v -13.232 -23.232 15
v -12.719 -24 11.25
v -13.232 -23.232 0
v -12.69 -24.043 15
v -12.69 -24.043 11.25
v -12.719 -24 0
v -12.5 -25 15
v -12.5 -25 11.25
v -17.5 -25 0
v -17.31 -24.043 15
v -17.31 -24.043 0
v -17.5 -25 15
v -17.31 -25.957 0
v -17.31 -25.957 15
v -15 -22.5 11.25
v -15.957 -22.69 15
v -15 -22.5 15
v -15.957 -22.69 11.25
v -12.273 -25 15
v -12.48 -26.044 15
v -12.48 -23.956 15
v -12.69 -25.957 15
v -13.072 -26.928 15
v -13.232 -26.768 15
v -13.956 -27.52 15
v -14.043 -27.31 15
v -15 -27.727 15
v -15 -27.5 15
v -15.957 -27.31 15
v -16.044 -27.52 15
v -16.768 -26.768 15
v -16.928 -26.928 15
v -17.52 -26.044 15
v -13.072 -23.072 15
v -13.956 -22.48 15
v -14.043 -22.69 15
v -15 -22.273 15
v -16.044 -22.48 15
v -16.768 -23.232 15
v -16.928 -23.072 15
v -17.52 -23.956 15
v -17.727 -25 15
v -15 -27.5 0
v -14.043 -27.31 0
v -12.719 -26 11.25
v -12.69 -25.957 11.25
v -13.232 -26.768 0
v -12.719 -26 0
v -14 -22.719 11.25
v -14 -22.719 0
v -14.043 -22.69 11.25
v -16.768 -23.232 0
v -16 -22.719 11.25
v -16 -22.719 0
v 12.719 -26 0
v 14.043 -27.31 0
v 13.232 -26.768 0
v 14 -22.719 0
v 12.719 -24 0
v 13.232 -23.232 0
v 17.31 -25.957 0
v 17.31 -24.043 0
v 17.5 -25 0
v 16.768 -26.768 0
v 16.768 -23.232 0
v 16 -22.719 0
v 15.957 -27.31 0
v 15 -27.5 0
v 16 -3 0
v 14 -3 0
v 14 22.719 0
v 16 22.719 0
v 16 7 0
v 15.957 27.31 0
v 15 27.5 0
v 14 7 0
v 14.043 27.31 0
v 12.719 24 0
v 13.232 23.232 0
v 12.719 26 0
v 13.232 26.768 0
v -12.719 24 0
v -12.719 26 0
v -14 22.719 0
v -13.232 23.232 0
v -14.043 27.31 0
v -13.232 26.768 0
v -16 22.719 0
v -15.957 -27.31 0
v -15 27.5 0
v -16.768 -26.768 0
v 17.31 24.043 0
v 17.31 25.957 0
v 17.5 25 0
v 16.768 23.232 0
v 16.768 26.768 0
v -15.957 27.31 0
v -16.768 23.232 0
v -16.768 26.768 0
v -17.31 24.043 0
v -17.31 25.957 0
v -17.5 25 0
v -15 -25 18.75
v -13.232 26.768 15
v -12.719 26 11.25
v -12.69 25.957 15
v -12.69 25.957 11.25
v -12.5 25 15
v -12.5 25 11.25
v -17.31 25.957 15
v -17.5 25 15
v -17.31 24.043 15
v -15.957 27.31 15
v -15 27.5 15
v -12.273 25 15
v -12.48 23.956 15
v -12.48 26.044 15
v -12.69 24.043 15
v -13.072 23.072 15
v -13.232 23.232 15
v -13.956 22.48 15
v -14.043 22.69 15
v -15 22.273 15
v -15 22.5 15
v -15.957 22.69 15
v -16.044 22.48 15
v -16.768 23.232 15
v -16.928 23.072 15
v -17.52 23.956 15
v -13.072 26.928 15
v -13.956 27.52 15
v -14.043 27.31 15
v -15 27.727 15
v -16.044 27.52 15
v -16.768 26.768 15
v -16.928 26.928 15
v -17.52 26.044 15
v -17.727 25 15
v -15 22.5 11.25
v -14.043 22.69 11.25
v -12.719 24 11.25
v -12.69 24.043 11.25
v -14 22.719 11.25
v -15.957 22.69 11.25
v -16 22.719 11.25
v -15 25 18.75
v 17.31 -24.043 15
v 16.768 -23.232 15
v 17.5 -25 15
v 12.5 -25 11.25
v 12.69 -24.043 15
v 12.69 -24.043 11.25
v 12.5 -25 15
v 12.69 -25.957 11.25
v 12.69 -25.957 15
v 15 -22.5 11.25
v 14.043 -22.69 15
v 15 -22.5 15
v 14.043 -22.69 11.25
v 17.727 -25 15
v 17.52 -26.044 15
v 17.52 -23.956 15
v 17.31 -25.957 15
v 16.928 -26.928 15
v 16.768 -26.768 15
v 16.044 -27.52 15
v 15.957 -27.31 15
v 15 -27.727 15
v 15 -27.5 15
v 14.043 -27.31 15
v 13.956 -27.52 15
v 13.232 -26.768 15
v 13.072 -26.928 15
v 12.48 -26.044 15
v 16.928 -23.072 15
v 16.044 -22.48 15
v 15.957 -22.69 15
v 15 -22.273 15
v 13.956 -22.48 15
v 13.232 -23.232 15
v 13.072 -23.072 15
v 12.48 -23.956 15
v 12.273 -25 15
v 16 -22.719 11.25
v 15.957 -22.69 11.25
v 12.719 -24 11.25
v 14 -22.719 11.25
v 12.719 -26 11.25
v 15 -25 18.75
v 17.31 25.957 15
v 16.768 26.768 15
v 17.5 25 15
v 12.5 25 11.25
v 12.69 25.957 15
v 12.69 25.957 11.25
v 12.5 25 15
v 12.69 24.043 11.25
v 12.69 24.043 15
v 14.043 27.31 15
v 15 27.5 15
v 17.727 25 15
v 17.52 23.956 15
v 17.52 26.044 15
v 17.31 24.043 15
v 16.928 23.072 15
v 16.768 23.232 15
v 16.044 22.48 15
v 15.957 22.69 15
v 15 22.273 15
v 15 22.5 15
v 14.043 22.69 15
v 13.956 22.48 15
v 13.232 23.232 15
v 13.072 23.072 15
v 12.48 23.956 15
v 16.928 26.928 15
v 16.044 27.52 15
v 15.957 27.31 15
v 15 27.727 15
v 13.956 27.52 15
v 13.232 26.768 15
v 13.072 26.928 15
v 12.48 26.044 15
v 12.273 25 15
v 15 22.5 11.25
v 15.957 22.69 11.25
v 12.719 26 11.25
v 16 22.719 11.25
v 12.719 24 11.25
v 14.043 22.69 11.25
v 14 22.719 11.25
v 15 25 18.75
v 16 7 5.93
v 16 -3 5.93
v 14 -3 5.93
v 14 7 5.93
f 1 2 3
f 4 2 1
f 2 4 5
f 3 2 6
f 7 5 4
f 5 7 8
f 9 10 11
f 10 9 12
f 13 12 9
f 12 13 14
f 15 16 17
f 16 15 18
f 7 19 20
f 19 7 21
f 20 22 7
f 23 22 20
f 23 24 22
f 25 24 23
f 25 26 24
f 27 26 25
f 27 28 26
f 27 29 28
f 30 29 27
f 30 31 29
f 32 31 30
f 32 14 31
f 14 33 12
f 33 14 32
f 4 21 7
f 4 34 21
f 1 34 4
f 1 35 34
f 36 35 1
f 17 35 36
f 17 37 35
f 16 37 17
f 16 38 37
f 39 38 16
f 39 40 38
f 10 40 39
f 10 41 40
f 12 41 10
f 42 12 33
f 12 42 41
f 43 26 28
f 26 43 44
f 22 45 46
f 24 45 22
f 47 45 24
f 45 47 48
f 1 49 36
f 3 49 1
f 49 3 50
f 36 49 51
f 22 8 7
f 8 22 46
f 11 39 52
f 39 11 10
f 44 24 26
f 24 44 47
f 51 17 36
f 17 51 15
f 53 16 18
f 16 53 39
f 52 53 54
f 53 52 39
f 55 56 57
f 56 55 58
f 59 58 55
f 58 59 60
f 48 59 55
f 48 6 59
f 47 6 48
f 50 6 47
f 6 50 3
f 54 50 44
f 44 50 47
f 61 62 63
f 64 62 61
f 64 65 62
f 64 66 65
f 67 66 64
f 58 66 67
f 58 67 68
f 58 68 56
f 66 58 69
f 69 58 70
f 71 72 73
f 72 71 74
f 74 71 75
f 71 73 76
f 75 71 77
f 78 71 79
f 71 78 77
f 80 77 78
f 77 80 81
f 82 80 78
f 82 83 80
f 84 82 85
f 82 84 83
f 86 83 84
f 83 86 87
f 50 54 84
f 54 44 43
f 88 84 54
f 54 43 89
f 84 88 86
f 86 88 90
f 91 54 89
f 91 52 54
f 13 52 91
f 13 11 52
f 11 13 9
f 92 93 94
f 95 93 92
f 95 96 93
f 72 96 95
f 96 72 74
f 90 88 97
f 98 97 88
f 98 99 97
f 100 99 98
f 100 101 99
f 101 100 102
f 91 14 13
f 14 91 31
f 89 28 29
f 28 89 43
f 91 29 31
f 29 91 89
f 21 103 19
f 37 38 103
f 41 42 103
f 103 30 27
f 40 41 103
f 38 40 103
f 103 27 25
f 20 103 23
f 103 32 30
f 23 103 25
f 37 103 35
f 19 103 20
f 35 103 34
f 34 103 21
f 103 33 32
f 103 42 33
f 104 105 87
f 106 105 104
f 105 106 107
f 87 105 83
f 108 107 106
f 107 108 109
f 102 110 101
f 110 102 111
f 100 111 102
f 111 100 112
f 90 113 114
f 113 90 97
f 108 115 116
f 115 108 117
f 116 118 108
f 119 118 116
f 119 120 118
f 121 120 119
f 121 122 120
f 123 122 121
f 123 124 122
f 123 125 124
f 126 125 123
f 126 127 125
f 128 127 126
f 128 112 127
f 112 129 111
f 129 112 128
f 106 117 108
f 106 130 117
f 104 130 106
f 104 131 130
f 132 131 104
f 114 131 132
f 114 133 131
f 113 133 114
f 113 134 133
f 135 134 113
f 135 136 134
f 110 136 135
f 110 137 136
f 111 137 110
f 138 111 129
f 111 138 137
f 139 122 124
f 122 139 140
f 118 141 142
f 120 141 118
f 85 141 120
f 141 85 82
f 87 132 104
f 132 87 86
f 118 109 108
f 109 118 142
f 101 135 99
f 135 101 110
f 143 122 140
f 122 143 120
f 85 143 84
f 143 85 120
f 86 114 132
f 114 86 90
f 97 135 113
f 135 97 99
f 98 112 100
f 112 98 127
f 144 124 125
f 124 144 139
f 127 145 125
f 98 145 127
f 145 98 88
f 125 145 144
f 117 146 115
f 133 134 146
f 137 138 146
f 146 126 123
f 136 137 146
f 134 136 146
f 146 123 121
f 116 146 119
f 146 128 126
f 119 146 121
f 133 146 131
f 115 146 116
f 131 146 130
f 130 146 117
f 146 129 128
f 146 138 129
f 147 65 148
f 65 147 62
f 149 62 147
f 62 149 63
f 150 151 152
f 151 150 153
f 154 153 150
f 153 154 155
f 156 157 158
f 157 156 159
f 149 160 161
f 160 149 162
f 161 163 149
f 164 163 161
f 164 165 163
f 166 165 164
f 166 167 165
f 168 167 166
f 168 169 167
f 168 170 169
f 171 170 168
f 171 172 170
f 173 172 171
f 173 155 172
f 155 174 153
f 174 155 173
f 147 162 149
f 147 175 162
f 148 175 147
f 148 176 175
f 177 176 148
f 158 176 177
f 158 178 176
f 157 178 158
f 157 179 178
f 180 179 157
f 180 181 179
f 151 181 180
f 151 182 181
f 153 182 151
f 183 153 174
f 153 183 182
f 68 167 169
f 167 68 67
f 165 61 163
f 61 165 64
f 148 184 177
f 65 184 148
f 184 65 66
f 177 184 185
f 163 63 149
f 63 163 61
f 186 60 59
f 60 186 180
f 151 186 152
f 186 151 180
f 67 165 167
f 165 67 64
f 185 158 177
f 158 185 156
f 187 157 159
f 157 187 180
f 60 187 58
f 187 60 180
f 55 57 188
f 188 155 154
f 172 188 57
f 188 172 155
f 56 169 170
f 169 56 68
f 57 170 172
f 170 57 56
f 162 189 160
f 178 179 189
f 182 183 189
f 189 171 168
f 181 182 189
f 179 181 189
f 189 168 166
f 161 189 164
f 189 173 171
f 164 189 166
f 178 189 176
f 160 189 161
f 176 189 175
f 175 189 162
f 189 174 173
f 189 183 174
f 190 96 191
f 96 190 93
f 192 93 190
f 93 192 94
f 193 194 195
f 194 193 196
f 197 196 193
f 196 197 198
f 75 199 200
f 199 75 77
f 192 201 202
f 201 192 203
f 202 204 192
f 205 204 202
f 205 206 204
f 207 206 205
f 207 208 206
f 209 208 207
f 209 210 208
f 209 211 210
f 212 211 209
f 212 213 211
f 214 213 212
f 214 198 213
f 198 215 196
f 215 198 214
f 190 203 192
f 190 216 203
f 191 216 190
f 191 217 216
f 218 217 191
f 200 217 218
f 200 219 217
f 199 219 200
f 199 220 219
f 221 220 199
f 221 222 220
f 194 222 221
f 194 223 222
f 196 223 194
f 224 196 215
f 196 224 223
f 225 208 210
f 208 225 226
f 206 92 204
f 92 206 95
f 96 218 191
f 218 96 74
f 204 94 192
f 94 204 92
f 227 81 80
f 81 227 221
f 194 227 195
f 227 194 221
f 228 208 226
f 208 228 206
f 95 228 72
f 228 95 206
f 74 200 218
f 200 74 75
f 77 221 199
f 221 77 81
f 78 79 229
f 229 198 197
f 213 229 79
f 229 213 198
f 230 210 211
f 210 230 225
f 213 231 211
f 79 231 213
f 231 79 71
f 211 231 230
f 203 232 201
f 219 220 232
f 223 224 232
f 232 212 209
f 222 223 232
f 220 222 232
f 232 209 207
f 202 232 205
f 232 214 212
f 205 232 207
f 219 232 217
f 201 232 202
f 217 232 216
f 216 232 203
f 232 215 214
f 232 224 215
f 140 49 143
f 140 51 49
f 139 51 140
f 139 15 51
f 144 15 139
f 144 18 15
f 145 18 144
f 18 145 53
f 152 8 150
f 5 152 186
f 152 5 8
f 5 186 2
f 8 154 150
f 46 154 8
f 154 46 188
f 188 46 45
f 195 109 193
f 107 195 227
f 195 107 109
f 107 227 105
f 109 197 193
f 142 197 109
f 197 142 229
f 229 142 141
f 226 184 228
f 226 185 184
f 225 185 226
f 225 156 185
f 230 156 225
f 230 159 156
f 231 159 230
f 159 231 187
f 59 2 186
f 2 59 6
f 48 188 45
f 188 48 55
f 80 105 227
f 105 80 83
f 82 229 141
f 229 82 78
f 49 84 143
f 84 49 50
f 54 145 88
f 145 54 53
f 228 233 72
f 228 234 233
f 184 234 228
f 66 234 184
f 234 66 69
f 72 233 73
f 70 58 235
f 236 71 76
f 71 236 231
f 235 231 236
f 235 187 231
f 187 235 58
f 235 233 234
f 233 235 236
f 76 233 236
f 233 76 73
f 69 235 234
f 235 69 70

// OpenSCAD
//////////////////////////////////
wallThickness=30;
castleLength=50;
castleHeight=15;

$fn=16*1;
s = [wallThickness, castleLength, castleHeight];
walls=2;

castle();
module castle() 
{
    difference(){
        union(){
            //four corner towers
            for(x=[-1:2:1], y=[-1:2:1])
            translate([s[0]/2*x, s[1]/2*y, 0])
            tower(height=s[2]);
    
            //sidewalls
            for(y=[-1:2:1])
            translate([0,y*s[1]/2, 0])
            wall([s[0], walls, s[2]*3/4], false);
            //front and back walls
            for(x=[-1:2:1])
            translate([x*s[0]/2, 0, 0])
            wall([walls, s[1], s[2]*3/4]);
        }
        maindoor();
    }
}
module tower(height = 15)
{
    translate([0, 0, height/2])
    union()
    {
        cylinder(d=height/3, h=height, center=true);
        translate([0,0, height*5/8])
        cylinder(d1=height/2.75, d2=0, h=height/4, center=true);
    }
}
module wall(dims=[30, 3, 10])
{
    translate([0, 0, dims[2]/2])
    cube(dims, center=true);
    
} 
module maindoor()
{
      translate([14,-3,-.07]) cube([10,10,6]);
} 
